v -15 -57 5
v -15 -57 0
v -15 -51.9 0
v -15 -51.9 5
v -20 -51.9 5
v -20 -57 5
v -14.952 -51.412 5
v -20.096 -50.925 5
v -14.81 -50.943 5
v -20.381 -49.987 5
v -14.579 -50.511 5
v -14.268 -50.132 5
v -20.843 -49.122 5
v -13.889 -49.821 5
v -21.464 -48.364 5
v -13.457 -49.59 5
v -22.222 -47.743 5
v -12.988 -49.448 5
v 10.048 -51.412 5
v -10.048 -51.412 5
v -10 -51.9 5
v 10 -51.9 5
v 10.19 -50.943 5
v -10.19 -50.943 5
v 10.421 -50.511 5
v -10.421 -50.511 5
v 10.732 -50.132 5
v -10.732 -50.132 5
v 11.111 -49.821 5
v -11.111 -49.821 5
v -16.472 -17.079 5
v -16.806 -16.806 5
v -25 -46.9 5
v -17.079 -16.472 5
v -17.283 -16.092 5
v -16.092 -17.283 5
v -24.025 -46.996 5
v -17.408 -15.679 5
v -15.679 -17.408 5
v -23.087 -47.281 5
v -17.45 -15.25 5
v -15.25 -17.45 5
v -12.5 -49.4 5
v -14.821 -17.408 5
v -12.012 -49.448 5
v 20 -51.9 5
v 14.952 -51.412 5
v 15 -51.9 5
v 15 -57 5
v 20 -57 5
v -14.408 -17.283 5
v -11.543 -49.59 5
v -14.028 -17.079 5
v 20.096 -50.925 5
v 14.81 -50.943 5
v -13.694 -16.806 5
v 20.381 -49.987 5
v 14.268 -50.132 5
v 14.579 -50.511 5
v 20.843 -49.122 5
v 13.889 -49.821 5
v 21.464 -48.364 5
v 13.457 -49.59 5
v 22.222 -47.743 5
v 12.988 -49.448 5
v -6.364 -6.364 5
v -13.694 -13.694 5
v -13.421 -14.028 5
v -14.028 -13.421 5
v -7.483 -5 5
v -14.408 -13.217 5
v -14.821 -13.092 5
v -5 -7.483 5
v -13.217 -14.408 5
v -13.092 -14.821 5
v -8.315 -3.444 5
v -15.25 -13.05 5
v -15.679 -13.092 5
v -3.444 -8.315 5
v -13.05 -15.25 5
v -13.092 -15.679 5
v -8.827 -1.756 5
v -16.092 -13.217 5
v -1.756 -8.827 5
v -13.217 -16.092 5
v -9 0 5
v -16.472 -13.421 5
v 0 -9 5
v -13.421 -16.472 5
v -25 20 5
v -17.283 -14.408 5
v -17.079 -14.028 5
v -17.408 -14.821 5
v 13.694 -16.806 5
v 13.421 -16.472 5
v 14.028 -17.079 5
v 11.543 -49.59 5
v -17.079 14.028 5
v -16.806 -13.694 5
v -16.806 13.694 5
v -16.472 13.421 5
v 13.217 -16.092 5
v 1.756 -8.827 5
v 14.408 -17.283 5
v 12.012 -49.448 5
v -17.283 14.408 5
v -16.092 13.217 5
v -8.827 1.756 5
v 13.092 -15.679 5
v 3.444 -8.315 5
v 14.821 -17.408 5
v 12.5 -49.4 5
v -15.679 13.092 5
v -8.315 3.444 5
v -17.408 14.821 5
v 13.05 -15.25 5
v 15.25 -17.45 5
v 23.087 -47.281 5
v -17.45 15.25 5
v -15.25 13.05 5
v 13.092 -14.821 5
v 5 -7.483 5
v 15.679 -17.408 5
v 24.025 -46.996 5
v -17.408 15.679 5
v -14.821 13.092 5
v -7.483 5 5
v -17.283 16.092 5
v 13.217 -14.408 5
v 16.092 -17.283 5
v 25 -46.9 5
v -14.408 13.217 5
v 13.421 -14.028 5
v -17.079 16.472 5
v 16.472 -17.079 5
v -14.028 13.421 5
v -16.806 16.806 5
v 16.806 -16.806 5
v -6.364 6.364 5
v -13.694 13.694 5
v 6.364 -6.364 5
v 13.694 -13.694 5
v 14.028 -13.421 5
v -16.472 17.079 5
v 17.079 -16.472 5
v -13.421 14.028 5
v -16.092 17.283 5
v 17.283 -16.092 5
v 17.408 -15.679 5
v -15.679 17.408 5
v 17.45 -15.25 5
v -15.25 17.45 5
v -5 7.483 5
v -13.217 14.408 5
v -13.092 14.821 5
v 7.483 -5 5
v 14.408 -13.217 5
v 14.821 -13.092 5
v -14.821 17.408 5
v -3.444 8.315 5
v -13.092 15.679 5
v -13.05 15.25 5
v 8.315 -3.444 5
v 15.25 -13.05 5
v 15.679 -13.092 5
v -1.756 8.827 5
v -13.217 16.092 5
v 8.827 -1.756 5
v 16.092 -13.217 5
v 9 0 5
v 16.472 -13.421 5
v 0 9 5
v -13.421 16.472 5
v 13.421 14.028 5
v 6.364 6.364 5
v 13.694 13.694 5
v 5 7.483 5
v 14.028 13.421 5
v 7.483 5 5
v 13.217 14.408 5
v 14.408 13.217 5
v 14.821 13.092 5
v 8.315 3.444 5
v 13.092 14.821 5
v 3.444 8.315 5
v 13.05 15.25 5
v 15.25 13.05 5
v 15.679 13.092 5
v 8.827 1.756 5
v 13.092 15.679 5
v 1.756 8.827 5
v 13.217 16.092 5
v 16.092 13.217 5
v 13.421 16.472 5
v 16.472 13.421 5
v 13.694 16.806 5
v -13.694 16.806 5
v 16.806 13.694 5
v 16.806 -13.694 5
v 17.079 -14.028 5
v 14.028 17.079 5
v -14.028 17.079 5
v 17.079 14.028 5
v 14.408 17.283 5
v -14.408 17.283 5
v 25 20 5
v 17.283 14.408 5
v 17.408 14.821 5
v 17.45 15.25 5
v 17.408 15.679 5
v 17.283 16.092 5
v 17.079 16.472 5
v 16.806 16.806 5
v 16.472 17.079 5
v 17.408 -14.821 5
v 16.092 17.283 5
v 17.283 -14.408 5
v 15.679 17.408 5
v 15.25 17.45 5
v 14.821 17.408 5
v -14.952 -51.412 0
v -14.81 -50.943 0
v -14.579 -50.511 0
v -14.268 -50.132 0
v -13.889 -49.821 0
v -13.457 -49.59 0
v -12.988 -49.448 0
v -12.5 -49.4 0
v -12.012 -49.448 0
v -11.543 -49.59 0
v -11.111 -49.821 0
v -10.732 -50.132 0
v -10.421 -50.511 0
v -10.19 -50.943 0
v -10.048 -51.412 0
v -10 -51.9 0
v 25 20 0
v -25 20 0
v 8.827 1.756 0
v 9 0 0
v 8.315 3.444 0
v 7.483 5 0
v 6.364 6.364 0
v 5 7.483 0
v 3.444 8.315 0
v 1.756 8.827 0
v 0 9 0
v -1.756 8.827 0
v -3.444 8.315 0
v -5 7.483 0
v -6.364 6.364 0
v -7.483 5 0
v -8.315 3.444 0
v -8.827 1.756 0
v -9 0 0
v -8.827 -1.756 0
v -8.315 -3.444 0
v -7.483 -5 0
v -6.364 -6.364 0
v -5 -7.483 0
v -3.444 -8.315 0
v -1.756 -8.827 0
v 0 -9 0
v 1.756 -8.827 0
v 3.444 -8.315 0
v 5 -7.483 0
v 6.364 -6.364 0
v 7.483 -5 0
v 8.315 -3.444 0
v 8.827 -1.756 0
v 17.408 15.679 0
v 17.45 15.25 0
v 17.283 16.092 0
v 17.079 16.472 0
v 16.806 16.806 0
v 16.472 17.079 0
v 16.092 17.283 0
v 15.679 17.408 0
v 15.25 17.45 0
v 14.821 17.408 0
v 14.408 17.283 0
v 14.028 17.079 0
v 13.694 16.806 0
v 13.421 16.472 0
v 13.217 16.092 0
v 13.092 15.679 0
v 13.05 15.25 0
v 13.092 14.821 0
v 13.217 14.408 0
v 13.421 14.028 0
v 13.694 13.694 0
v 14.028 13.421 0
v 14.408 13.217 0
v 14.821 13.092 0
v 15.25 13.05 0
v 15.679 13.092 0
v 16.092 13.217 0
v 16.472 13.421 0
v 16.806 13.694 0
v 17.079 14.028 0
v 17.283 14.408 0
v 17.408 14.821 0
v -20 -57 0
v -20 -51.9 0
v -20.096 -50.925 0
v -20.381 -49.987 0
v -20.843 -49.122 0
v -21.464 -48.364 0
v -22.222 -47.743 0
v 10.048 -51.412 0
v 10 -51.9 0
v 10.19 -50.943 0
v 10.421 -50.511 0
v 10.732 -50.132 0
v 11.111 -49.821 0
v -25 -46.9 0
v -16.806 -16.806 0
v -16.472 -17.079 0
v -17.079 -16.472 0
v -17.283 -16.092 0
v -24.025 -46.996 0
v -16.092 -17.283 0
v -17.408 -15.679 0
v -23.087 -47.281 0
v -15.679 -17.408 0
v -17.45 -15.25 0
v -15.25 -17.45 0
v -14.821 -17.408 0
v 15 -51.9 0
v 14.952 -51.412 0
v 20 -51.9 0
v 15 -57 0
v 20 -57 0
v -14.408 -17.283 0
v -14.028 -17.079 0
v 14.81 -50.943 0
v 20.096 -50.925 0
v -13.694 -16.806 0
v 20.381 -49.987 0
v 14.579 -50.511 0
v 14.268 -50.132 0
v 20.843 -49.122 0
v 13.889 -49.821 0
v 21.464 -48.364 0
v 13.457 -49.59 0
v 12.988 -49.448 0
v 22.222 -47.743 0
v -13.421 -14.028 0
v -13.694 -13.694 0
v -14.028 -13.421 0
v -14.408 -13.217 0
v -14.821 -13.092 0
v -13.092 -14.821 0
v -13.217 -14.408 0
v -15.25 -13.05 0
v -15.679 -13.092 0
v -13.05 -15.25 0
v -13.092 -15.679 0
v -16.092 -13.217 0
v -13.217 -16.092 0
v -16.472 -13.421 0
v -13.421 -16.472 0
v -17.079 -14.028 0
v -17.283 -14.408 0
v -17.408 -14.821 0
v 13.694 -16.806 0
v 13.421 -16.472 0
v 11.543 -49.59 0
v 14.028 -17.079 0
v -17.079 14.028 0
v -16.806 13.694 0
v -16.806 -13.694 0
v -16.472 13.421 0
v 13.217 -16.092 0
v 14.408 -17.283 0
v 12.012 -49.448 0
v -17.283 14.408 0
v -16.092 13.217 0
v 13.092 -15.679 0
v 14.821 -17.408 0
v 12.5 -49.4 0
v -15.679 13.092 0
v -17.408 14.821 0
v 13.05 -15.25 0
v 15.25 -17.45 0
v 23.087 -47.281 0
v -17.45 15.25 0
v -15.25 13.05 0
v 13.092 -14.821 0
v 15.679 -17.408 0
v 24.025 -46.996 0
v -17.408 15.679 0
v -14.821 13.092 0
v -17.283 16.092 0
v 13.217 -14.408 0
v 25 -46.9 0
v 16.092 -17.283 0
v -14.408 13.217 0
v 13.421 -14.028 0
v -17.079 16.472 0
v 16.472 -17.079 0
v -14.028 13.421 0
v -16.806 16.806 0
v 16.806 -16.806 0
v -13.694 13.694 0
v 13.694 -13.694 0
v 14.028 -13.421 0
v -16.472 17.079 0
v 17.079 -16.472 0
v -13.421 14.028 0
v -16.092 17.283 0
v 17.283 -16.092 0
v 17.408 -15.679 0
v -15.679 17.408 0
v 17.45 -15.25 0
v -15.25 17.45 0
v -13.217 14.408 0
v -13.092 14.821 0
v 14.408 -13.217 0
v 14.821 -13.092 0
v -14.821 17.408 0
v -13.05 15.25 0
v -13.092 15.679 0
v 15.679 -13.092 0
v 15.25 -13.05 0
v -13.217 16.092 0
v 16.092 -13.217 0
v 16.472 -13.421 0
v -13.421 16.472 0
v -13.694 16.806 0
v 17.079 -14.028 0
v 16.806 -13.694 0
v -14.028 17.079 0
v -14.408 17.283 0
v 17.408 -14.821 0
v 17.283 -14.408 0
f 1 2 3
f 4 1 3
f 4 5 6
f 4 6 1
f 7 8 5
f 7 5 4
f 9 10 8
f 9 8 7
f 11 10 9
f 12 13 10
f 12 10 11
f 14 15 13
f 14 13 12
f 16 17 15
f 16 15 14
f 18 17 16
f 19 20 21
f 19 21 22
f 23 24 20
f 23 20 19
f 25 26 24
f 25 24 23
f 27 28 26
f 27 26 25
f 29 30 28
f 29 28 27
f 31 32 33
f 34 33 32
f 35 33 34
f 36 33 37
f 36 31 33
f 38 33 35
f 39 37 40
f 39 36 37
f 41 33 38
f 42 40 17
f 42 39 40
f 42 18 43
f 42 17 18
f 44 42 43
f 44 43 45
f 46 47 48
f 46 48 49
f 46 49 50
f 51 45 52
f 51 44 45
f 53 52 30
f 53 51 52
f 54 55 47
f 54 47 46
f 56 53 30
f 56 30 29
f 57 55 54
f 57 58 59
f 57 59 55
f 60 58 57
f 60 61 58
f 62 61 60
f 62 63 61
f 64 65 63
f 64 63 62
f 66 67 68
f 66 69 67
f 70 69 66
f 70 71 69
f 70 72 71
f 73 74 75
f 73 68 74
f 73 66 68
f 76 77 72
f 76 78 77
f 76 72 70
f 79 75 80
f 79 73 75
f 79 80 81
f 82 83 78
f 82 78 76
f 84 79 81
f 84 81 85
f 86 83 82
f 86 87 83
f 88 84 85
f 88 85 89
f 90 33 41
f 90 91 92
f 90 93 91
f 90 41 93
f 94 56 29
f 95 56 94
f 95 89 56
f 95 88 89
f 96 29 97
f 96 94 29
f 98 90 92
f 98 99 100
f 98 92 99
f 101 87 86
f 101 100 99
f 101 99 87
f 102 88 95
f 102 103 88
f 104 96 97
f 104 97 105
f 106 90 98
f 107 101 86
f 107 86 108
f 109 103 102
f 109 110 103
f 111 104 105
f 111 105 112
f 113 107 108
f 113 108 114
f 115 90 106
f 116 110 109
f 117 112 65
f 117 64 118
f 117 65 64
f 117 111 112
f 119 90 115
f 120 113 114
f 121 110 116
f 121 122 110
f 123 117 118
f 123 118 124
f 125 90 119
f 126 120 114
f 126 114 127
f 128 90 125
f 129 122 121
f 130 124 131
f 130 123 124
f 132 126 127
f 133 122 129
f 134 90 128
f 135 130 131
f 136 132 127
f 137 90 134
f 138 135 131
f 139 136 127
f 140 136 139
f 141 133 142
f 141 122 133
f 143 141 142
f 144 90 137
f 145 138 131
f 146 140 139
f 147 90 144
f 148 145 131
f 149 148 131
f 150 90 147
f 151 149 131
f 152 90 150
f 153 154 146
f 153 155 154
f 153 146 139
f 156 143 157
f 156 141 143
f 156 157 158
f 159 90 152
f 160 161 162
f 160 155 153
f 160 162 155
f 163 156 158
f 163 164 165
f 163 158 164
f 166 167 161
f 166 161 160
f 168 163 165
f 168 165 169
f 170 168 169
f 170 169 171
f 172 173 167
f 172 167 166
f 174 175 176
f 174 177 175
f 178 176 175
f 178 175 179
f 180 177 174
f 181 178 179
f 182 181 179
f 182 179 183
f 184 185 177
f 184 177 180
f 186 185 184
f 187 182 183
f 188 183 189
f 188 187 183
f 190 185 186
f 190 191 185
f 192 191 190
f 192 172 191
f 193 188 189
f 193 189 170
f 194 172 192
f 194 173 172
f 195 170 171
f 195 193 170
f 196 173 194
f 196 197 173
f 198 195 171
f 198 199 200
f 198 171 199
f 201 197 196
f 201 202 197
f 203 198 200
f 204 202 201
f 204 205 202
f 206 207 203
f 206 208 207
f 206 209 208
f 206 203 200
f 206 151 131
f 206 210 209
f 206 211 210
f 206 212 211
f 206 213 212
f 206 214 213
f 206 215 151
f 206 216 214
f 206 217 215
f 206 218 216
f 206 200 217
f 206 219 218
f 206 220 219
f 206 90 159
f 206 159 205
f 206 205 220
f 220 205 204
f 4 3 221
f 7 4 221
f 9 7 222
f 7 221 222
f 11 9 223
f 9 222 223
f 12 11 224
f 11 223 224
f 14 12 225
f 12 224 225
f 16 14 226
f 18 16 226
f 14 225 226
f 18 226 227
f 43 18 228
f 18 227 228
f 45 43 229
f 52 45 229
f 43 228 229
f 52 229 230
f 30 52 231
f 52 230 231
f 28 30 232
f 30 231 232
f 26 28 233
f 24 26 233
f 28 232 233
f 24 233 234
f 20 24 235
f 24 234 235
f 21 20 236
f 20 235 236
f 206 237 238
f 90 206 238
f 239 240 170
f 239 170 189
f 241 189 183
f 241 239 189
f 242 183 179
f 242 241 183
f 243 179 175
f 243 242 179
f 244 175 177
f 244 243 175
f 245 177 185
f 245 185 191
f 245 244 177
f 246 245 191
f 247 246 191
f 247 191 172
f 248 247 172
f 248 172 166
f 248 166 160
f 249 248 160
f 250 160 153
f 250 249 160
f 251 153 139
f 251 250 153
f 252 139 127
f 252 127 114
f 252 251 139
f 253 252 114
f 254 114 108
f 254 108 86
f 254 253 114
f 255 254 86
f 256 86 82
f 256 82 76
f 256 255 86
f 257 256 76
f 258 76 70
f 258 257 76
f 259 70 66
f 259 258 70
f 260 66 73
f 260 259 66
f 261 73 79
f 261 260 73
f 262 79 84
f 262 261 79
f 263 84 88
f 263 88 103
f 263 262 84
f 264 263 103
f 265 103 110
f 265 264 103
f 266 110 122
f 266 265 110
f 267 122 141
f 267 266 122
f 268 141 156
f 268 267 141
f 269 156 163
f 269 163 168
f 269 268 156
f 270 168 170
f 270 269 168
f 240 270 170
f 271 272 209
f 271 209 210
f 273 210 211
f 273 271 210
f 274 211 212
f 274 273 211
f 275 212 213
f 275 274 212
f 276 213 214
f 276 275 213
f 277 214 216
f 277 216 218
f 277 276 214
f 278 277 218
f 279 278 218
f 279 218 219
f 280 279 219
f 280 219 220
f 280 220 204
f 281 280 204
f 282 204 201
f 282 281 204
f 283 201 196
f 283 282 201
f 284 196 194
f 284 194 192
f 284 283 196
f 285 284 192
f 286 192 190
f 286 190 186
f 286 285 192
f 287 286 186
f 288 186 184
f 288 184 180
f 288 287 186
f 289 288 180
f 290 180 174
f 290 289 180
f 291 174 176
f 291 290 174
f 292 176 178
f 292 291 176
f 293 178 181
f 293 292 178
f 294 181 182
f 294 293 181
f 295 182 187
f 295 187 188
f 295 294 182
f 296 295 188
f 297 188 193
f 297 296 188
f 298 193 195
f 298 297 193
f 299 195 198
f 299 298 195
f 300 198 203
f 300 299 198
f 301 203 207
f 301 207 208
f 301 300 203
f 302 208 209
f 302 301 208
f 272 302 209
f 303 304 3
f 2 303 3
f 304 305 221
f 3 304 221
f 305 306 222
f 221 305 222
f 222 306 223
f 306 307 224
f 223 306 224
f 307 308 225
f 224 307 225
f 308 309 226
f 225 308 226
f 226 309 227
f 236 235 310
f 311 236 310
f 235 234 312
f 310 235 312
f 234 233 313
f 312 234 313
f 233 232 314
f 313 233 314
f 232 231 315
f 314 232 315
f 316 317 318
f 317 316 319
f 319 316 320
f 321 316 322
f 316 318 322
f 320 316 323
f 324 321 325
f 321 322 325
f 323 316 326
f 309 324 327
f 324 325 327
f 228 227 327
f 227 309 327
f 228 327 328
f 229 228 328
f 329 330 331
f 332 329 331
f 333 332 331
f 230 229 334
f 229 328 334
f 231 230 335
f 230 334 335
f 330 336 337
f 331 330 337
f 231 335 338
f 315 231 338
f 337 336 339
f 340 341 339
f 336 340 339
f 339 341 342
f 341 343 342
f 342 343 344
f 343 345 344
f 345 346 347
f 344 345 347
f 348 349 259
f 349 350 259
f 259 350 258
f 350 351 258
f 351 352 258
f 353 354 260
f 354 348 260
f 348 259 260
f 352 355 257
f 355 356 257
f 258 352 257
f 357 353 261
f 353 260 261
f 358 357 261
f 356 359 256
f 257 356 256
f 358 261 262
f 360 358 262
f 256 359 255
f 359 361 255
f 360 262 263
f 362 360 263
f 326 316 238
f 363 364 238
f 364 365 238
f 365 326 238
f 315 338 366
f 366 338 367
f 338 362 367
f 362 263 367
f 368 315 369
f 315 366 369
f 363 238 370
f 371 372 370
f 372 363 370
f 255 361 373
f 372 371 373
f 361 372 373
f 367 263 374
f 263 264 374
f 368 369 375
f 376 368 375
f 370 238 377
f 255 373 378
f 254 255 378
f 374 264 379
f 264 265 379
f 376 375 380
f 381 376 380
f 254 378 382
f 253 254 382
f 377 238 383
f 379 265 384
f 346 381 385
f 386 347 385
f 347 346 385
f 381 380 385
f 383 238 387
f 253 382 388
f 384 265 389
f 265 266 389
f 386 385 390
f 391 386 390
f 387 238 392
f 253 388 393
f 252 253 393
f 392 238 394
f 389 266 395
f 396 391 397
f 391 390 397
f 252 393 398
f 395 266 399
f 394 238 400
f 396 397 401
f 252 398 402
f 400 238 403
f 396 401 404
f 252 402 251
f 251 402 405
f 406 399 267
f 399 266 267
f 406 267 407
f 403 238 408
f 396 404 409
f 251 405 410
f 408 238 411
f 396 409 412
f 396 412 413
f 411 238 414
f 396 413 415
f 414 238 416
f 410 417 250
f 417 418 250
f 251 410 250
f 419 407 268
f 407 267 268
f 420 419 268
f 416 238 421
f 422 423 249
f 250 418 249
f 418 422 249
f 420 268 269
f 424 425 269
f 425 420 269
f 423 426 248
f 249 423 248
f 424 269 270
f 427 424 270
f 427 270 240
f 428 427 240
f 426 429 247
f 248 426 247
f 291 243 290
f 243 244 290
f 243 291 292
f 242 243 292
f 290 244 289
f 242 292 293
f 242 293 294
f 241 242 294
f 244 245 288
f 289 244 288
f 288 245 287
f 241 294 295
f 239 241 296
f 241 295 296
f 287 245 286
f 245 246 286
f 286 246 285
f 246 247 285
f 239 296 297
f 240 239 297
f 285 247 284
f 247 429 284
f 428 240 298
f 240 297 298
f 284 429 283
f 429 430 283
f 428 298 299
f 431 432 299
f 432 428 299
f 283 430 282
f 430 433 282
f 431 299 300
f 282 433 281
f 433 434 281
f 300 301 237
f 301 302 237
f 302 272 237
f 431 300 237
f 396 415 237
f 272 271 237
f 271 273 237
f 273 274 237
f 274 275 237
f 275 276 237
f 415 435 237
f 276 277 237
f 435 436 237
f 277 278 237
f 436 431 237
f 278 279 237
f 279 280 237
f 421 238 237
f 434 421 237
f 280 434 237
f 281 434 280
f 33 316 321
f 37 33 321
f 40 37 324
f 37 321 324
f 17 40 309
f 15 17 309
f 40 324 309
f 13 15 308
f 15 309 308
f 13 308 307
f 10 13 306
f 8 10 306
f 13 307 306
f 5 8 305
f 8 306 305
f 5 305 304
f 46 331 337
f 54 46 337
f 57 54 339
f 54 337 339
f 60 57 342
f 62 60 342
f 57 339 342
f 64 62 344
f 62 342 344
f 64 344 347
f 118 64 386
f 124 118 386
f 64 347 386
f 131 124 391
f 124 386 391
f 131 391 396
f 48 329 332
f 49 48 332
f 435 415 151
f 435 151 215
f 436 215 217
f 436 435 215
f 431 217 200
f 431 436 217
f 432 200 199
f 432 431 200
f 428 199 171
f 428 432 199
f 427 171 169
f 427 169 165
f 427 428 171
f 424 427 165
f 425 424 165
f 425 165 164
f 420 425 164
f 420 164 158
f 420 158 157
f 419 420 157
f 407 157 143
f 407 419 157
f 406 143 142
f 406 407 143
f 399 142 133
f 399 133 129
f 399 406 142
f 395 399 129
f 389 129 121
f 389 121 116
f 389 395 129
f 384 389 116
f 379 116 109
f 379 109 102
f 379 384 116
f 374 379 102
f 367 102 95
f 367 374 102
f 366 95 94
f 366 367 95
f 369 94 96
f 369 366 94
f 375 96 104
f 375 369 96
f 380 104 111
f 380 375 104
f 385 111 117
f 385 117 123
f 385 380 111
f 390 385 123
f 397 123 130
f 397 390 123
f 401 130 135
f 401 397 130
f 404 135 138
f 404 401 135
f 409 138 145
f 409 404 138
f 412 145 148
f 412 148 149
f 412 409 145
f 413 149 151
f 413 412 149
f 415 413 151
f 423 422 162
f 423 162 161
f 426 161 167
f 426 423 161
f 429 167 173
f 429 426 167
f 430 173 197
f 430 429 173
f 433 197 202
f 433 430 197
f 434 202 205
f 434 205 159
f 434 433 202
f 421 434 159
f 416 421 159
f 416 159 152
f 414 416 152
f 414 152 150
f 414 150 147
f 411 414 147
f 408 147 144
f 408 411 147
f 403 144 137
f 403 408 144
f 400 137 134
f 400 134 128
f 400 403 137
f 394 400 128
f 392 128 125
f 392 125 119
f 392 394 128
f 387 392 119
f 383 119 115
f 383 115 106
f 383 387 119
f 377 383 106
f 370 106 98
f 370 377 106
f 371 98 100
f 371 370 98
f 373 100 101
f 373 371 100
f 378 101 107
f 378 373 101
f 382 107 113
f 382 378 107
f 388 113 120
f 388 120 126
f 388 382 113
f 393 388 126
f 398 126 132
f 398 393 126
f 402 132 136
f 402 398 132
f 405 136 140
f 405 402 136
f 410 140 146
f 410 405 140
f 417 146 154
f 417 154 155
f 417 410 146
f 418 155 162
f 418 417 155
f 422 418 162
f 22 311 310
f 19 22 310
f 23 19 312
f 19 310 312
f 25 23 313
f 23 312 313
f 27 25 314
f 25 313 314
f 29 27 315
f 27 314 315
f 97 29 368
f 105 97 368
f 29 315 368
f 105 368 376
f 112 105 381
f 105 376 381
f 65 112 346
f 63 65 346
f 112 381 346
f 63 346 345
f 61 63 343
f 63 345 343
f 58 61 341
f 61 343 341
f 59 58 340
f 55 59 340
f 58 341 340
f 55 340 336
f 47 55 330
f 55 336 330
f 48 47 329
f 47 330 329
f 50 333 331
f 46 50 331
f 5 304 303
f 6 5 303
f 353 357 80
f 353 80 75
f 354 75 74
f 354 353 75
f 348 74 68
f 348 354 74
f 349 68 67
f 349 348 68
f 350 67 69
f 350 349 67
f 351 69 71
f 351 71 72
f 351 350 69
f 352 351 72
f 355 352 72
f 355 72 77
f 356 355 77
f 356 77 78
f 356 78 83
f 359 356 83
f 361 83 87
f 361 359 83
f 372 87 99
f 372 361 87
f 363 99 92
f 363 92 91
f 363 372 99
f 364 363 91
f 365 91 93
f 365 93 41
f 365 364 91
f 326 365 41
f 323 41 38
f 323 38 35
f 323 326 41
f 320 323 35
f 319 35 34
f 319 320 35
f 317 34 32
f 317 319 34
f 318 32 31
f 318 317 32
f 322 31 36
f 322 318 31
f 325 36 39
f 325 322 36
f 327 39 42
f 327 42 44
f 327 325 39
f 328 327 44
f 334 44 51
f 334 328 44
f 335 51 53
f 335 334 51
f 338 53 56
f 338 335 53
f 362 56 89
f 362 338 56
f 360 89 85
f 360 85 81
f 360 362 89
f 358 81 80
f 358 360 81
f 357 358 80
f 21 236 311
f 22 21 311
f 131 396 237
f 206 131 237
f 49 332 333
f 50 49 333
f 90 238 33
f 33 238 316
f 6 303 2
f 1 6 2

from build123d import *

# Parameters (mm, degrees)
F1_R     = 2.2
F1_R_2   = 9
F2_DEPTH = 5


# Not quite as in the source:
# - a feature names something its author has since deleted; it is built from what else it names


with BuildPart() as f2:
    # F1 (on Top) → F2 (new body)
    with BuildSketch(Plane.XY):
        with BuildLine():
            Line((25, 20), (20, 20))
            Line((20, 20), (-20, 20))
            Line((-20, 20), (-25, 20))
            Line((-25, 20), (-25, -46.9))
            ThreePointArc((-25, -46.9), (-21.4644660941, -48.3644660941), (-20, -51.9))
            Line((-20, -51.9), (-20, -57))
            Line((-20, -57), (-15, -57))
            Line((-15, -57), (-15, -51.9))
            ThreePointArc((-15, -51.9), (-12.5, -49.4), (-10, -51.9))
            Line((-10, -51.9), (0, -51.9))
            Line((0, -51.9), (10, -51.9))
            ThreePointArc((10, -51.9), (12.5, -49.4), (15, -51.9))
            Line((15, -51.9), (15, -57))
            Line((15, -57), (20, -57))
            Line((20, -57), (20, -51.9))
            ThreePointArc((20, -51.9), (21.4644660941, -48.3644660941), (25, -46.9))
            Line((25, -46.9), (25, 20))
        make_face()
        with Locations((-15.25, -15.25)):
            Circle(F1_R, mode=Mode.SUBTRACT)
        with Locations((-15.25, 15.25)):
            Circle(F1_R, mode=Mode.SUBTRACT)
        Circle(F1_R_2, mode=Mode.SUBTRACT)
        with Locations((15.25, -15.25)):
            Circle(F1_R, mode=Mode.SUBTRACT)
        with Locations((15.25, 15.25)):
            Circle(F1_R, mode=Mode.SUBTRACT)
    extrude(amount=F2_DEPTH)


solid = f2.part
